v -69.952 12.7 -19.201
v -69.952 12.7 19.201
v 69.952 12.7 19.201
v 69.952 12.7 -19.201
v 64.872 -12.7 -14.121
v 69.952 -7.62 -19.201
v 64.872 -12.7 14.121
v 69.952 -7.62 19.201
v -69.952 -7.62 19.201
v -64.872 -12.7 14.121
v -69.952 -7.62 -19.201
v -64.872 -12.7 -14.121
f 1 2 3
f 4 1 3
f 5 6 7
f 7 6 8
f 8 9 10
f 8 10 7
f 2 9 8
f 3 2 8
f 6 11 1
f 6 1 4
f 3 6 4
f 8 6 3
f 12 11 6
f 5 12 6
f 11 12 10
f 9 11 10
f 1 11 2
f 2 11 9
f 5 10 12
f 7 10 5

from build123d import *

# Parameters (mm, degrees)
F0_W     = 139.9047672749
F0_H     = 38.4024083614
F1_DEPTH = 12.7
F2_DEPTH = 12.7
F3_SIZE  = 5.08


# Not quite as in the source:
# - the program builds the solid bodies; features that only make, move or delete a surface that nothing else refers to are left out


with BuildPart() as f1:
    # F0 (on Front) → F1 (new body)
    with BuildSketch(Plane.XZ):
        Rectangle(F0_W, F0_H)
    extrude(amount=F1_DEPTH)

    # F2 (add): a face of the model
    f2_faces = [f1.faces().sort_by_distance(p)[0] for p in [
        (0, 0, 0),
    ]]
    extrude(f2_faces, amount=F2_DEPTH)

    # F3
    f3_edges = [f1.edges().sort_by_distance(p)[0] for p in [
        (69.952384, -12.7, 0),
        (0, -12.7, 19.201204),
        (-69.952384, -12.7, 0),
        (0, -12.7, -19.201204),
    ]]
    chamfer(f3_edges, length=F3_SIZE)


solid = f1.part
